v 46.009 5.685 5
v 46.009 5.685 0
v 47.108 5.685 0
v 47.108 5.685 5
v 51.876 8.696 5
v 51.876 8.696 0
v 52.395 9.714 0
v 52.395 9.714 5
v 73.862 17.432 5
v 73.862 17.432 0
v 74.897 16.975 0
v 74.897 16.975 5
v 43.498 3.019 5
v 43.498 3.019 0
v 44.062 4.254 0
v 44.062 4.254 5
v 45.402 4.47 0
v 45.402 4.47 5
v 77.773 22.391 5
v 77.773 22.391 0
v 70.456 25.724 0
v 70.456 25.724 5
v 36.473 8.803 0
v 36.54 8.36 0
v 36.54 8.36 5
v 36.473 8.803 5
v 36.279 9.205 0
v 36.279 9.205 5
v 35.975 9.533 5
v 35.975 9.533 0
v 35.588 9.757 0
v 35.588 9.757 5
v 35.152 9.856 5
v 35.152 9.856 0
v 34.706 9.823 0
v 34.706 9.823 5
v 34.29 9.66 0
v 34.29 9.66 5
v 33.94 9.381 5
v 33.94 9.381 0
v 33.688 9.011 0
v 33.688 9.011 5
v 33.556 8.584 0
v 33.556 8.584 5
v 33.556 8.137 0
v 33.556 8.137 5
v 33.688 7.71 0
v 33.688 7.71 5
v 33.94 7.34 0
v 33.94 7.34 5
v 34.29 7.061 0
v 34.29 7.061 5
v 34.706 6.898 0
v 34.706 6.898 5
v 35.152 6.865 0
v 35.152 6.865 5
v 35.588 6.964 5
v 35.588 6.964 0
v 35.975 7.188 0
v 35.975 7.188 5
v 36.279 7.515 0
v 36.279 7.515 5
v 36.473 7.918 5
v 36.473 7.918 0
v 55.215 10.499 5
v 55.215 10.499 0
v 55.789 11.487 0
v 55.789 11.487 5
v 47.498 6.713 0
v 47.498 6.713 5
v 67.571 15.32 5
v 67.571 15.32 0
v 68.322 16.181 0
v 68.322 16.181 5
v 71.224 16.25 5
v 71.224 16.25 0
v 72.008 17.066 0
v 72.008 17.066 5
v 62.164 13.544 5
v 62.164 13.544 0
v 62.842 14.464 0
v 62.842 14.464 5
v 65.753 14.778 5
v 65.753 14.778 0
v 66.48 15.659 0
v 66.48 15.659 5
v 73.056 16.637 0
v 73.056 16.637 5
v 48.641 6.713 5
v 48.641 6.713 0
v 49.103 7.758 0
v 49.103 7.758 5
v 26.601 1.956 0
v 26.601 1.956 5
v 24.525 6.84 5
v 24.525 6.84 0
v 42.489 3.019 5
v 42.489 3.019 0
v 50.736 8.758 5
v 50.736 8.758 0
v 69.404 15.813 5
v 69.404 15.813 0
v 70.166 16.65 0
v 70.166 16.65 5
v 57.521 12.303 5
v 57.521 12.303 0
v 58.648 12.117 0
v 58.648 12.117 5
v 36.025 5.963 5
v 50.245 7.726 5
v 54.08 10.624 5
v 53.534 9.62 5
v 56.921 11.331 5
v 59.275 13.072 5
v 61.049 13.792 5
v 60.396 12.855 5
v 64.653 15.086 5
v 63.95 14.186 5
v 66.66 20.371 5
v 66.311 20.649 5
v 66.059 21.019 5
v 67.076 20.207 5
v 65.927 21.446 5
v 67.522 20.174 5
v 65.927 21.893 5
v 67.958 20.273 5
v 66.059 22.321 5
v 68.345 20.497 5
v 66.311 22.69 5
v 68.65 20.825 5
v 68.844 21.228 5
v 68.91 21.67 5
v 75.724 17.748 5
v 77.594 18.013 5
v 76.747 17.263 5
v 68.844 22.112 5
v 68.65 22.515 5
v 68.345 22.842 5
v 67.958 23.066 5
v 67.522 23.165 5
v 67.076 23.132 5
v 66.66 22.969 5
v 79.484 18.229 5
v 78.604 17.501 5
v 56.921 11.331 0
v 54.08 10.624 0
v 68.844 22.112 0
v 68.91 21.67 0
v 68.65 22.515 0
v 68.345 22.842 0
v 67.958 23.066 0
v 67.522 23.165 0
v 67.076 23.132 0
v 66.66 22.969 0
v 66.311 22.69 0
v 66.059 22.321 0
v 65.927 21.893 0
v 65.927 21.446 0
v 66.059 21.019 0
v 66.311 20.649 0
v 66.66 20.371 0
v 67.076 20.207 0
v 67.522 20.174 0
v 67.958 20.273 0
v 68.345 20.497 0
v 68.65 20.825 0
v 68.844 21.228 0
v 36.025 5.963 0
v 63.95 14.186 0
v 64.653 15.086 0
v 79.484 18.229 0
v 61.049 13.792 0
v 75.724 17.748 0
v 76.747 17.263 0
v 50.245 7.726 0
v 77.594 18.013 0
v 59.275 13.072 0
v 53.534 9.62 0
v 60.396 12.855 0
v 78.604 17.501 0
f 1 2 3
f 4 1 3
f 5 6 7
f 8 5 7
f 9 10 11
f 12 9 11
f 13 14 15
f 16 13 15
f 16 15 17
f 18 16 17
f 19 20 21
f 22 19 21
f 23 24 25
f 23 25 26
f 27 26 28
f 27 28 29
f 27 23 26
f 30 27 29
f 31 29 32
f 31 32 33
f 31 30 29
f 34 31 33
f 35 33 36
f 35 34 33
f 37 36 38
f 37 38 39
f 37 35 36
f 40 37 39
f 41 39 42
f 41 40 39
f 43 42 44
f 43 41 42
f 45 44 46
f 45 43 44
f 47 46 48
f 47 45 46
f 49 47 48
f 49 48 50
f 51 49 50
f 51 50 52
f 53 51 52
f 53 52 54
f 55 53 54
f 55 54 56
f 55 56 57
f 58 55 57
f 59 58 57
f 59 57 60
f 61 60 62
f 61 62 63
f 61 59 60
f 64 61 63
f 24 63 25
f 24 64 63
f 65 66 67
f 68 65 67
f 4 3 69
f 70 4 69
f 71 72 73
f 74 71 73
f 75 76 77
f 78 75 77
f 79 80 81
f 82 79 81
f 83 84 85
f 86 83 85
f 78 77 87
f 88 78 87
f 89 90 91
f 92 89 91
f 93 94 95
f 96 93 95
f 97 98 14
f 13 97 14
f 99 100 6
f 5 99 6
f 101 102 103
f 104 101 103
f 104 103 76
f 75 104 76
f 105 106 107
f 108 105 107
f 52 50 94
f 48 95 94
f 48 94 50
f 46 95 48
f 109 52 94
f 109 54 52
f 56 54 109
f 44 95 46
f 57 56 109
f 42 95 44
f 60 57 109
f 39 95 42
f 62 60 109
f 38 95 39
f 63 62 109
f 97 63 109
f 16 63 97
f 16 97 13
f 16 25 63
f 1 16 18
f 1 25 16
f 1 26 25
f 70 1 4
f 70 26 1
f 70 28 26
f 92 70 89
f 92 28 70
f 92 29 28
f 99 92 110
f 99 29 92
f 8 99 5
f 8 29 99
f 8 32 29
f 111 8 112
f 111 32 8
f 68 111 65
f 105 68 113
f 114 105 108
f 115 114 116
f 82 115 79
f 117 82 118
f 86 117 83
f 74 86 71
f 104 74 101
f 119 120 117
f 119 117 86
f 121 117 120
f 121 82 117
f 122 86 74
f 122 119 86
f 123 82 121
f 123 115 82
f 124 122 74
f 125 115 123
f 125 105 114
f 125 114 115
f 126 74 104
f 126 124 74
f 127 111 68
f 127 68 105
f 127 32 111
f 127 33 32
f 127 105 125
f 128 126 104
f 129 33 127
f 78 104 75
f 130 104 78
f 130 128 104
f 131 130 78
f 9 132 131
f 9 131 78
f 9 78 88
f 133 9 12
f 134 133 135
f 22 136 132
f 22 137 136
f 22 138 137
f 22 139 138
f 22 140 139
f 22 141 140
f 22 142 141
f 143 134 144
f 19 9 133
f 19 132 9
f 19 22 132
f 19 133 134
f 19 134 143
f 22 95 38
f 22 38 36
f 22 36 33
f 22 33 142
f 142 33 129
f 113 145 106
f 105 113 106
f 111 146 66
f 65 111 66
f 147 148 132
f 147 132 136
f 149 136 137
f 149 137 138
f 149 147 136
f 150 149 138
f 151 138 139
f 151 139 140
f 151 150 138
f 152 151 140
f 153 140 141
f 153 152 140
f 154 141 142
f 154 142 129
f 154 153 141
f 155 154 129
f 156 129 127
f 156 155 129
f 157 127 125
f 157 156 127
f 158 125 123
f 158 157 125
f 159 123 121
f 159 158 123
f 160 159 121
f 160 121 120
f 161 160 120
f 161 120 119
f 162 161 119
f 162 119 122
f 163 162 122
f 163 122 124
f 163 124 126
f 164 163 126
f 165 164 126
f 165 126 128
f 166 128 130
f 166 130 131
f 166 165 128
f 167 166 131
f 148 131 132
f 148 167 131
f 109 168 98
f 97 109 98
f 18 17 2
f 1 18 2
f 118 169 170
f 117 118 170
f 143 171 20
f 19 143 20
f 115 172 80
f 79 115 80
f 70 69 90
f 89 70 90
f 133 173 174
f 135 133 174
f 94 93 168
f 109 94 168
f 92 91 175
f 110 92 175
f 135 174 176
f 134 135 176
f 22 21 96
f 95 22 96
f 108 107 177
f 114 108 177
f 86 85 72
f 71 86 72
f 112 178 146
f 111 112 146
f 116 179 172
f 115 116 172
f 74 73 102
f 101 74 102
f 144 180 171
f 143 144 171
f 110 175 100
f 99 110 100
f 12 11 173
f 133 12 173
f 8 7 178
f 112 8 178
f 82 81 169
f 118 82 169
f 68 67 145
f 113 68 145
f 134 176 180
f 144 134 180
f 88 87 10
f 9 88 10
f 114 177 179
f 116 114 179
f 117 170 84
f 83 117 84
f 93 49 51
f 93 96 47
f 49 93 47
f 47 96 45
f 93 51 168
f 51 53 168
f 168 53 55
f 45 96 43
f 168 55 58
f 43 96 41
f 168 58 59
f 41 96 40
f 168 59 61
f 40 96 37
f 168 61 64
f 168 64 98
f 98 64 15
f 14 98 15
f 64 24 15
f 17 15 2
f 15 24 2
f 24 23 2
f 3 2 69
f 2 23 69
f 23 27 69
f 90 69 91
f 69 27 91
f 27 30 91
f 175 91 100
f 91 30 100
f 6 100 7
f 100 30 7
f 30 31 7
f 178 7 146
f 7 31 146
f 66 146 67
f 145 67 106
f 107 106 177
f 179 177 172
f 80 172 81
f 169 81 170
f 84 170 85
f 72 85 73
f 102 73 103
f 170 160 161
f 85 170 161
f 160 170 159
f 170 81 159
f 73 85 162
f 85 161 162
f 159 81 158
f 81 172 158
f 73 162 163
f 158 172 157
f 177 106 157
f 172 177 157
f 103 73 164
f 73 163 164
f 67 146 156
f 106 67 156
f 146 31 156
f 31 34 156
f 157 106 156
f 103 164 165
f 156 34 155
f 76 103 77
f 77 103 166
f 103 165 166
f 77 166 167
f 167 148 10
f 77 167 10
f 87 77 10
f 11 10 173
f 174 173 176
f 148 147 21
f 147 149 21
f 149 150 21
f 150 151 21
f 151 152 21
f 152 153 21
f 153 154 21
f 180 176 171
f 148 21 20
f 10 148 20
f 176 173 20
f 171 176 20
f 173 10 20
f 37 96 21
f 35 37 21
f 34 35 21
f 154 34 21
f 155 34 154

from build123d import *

# Parameters (mm, degrees)
SKETCH_1_R          = 1.5
EXTRUDE_1_DEPTH     = 5
CUT_EXTRUDE_1_DEPTH = 84.692683778


with BuildPart() as part:
    # 스케치1 → 보스-돌출1 (new body)
    with BuildSketch(Plane.XY):
        with BuildLine():
            Line((20.05, 5), (0, 5))
            ThreePointArc((0, 5), (-5, 0), (0, -5))
            Line((0, -5), (22, -5))
            Line((22, -5), (26.601353767, 1.956410875))
            Line((26.601353767, 1.956410875), (36.025134241, 5.963228766))
            Line((36.025134241, 5.963228766), (42.488975113, 3.018953392))
            Line((42.488975113, 3.018953392), (43.498164032, 3.018953392))
            Line((43.498164032, 3.018953392), (44.062133892, 4.253931713))
            Line((44.062133892, 4.253931713), (45.402427297, 4.470373499))
            Line((45.402427297, 4.470373499), (46.008680673, 5.685153438))
            Line((46.008680673, 5.685153438), (47.107948843, 5.685153438))
            Line((47.107948843, 5.685153438), (47.498446434, 6.712724429))
            Line((47.498446434, 6.712724429), (48.640951743, 6.712724429))
            Line((48.640951743, 6.712724429), (49.103035082, 7.757615508))
            Line((49.103035082, 7.757615508), (50.245112942, 7.726365831))
            Line((50.245112942, 7.726365831), (50.735603144, 8.758227131))
            Line((50.735603144, 8.758227131), (51.876398977, 8.69575116))
            Line((51.876398977, 8.69575116), (52.394929025, 9.713810574))
            Line((52.394929025, 9.713810574), (53.533589213, 9.620155058))
            Line((53.533589213, 9.620155058), (54.079771108, 10.623650806))
            Line((54.079771108, 10.623650806), (55.215443631, 10.498885825))
            Line((55.215443631, 10.498885825), (55.788868685, 11.487067026))
            Line((55.788868685, 11.487067026), (56.920703758, 11.331285936))
            Line((56.920703758, 11.331285936), (57.520942896, 12.303413169))
            Line((57.520942896, 12.303413169), (58.648093605, 12.116732536))
            Line((58.648093605, 12.116732536), (59.274697688, 13.072078391))
            Line((59.274697688, 13.072078391), (60.396320625, 12.854637901))
            Line((60.396320625, 12.854637901), (61.048820788, 13.792487525))
            Line((61.048820788, 13.792487525), (62.164076682, 13.544449883))
            Line((62.164076682, 13.544449883), (62.84198468, 14.464101515))
            Line((62.84198468, 14.464101515), (63.950039022, 14.185652318))
            Line((63.950039022, 14.185652318), (64.652847601, 15.086417815))
            Line((64.652847601, 15.086417815), (65.752871272, 14.777765417))
            Line((65.752871272, 14.777765417), (66.480054544, 15.658970767))
            Line((66.480054544, 15.658970767), (67.571224435, 15.320346122))
            Line((67.571224435, 15.320346122), (68.322238273, 16.181331949))
            Line((68.322238273, 16.181331949), (69.403737898, 15.812988438))
            Line((69.403737898, 15.812988438), (70.165521035, 16.650113087))
            Line((70.165521035, 16.650113087), (71.224188399, 16.249719983))
            Line((71.224188399, 16.249719983), (72.008283749, 17.065983242))
            Line((72.008283749, 17.065983242), (73.055761076, 16.637168043))
            Line((73.055761076, 16.637168043), (73.861597574, 17.431975419))
            Line((73.861597574, 17.431975419), (74.897121975, 16.975050435))
            Line((74.897121975, 16.975050435), (75.724112721, 17.74782306))
            Line((75.724112721, 17.74782306), (76.746930013, 17.263121075))
            Line((76.746930013, 17.263121075), (77.594472701, 18.013296132))
            Line((77.594472701, 18.013296132), (78.603837954, 17.501170159))
            Line((78.603837954, 17.501170159), (79.484104239, 18.229489901))
            Line((79.484104239, 18.229489901), (77.772918882, 22.391441928))
            Line((77.772918882, 22.391441928), (70.455863435, 25.724355994))
            Line((70.455863435, 25.724355994), (20.05, 5))
        make_face()
        with Locations((35.039512437, 8.36046215)):
            Circle(SKETCH_1_R, mode=Mode.SUBTRACT)
        Circle(SKETCH_1_R, mode=Mode.SUBTRACT)
        with Locations((22, 0)):
            Circle(SKETCH_1_R, mode=Mode.SUBTRACT)
        with Locations((67.410250422, 21.669681595)):
            Circle(SKETCH_1_R, mode=Mode.SUBTRACT)
    extrude(amount=EXTRUDE_1_DEPTH)

    # 스케치2 → 컷-돌출1 (cut, through all)
    with BuildSketch(Plane.XY.offset(5)):
        with BuildLine():
            Line((26.601353767, 1.956410875), (24.524988327, 6.83989014))
            Line((24.524988327, 6.83989014), (20.05, 5))
            Line((20.05, 5), (0, 5))
            ThreePointArc((0, 5), (-5, 0), (0, -5))
            Line((0, -5), (22, -5))
            Line((22, -5), (26.601353767, 1.956410875))
        make_face()
    extrude(amount=-CUT_EXTRUDE_1_DEPTH, mode=Mode.SUBTRACT)


solid = part.part
